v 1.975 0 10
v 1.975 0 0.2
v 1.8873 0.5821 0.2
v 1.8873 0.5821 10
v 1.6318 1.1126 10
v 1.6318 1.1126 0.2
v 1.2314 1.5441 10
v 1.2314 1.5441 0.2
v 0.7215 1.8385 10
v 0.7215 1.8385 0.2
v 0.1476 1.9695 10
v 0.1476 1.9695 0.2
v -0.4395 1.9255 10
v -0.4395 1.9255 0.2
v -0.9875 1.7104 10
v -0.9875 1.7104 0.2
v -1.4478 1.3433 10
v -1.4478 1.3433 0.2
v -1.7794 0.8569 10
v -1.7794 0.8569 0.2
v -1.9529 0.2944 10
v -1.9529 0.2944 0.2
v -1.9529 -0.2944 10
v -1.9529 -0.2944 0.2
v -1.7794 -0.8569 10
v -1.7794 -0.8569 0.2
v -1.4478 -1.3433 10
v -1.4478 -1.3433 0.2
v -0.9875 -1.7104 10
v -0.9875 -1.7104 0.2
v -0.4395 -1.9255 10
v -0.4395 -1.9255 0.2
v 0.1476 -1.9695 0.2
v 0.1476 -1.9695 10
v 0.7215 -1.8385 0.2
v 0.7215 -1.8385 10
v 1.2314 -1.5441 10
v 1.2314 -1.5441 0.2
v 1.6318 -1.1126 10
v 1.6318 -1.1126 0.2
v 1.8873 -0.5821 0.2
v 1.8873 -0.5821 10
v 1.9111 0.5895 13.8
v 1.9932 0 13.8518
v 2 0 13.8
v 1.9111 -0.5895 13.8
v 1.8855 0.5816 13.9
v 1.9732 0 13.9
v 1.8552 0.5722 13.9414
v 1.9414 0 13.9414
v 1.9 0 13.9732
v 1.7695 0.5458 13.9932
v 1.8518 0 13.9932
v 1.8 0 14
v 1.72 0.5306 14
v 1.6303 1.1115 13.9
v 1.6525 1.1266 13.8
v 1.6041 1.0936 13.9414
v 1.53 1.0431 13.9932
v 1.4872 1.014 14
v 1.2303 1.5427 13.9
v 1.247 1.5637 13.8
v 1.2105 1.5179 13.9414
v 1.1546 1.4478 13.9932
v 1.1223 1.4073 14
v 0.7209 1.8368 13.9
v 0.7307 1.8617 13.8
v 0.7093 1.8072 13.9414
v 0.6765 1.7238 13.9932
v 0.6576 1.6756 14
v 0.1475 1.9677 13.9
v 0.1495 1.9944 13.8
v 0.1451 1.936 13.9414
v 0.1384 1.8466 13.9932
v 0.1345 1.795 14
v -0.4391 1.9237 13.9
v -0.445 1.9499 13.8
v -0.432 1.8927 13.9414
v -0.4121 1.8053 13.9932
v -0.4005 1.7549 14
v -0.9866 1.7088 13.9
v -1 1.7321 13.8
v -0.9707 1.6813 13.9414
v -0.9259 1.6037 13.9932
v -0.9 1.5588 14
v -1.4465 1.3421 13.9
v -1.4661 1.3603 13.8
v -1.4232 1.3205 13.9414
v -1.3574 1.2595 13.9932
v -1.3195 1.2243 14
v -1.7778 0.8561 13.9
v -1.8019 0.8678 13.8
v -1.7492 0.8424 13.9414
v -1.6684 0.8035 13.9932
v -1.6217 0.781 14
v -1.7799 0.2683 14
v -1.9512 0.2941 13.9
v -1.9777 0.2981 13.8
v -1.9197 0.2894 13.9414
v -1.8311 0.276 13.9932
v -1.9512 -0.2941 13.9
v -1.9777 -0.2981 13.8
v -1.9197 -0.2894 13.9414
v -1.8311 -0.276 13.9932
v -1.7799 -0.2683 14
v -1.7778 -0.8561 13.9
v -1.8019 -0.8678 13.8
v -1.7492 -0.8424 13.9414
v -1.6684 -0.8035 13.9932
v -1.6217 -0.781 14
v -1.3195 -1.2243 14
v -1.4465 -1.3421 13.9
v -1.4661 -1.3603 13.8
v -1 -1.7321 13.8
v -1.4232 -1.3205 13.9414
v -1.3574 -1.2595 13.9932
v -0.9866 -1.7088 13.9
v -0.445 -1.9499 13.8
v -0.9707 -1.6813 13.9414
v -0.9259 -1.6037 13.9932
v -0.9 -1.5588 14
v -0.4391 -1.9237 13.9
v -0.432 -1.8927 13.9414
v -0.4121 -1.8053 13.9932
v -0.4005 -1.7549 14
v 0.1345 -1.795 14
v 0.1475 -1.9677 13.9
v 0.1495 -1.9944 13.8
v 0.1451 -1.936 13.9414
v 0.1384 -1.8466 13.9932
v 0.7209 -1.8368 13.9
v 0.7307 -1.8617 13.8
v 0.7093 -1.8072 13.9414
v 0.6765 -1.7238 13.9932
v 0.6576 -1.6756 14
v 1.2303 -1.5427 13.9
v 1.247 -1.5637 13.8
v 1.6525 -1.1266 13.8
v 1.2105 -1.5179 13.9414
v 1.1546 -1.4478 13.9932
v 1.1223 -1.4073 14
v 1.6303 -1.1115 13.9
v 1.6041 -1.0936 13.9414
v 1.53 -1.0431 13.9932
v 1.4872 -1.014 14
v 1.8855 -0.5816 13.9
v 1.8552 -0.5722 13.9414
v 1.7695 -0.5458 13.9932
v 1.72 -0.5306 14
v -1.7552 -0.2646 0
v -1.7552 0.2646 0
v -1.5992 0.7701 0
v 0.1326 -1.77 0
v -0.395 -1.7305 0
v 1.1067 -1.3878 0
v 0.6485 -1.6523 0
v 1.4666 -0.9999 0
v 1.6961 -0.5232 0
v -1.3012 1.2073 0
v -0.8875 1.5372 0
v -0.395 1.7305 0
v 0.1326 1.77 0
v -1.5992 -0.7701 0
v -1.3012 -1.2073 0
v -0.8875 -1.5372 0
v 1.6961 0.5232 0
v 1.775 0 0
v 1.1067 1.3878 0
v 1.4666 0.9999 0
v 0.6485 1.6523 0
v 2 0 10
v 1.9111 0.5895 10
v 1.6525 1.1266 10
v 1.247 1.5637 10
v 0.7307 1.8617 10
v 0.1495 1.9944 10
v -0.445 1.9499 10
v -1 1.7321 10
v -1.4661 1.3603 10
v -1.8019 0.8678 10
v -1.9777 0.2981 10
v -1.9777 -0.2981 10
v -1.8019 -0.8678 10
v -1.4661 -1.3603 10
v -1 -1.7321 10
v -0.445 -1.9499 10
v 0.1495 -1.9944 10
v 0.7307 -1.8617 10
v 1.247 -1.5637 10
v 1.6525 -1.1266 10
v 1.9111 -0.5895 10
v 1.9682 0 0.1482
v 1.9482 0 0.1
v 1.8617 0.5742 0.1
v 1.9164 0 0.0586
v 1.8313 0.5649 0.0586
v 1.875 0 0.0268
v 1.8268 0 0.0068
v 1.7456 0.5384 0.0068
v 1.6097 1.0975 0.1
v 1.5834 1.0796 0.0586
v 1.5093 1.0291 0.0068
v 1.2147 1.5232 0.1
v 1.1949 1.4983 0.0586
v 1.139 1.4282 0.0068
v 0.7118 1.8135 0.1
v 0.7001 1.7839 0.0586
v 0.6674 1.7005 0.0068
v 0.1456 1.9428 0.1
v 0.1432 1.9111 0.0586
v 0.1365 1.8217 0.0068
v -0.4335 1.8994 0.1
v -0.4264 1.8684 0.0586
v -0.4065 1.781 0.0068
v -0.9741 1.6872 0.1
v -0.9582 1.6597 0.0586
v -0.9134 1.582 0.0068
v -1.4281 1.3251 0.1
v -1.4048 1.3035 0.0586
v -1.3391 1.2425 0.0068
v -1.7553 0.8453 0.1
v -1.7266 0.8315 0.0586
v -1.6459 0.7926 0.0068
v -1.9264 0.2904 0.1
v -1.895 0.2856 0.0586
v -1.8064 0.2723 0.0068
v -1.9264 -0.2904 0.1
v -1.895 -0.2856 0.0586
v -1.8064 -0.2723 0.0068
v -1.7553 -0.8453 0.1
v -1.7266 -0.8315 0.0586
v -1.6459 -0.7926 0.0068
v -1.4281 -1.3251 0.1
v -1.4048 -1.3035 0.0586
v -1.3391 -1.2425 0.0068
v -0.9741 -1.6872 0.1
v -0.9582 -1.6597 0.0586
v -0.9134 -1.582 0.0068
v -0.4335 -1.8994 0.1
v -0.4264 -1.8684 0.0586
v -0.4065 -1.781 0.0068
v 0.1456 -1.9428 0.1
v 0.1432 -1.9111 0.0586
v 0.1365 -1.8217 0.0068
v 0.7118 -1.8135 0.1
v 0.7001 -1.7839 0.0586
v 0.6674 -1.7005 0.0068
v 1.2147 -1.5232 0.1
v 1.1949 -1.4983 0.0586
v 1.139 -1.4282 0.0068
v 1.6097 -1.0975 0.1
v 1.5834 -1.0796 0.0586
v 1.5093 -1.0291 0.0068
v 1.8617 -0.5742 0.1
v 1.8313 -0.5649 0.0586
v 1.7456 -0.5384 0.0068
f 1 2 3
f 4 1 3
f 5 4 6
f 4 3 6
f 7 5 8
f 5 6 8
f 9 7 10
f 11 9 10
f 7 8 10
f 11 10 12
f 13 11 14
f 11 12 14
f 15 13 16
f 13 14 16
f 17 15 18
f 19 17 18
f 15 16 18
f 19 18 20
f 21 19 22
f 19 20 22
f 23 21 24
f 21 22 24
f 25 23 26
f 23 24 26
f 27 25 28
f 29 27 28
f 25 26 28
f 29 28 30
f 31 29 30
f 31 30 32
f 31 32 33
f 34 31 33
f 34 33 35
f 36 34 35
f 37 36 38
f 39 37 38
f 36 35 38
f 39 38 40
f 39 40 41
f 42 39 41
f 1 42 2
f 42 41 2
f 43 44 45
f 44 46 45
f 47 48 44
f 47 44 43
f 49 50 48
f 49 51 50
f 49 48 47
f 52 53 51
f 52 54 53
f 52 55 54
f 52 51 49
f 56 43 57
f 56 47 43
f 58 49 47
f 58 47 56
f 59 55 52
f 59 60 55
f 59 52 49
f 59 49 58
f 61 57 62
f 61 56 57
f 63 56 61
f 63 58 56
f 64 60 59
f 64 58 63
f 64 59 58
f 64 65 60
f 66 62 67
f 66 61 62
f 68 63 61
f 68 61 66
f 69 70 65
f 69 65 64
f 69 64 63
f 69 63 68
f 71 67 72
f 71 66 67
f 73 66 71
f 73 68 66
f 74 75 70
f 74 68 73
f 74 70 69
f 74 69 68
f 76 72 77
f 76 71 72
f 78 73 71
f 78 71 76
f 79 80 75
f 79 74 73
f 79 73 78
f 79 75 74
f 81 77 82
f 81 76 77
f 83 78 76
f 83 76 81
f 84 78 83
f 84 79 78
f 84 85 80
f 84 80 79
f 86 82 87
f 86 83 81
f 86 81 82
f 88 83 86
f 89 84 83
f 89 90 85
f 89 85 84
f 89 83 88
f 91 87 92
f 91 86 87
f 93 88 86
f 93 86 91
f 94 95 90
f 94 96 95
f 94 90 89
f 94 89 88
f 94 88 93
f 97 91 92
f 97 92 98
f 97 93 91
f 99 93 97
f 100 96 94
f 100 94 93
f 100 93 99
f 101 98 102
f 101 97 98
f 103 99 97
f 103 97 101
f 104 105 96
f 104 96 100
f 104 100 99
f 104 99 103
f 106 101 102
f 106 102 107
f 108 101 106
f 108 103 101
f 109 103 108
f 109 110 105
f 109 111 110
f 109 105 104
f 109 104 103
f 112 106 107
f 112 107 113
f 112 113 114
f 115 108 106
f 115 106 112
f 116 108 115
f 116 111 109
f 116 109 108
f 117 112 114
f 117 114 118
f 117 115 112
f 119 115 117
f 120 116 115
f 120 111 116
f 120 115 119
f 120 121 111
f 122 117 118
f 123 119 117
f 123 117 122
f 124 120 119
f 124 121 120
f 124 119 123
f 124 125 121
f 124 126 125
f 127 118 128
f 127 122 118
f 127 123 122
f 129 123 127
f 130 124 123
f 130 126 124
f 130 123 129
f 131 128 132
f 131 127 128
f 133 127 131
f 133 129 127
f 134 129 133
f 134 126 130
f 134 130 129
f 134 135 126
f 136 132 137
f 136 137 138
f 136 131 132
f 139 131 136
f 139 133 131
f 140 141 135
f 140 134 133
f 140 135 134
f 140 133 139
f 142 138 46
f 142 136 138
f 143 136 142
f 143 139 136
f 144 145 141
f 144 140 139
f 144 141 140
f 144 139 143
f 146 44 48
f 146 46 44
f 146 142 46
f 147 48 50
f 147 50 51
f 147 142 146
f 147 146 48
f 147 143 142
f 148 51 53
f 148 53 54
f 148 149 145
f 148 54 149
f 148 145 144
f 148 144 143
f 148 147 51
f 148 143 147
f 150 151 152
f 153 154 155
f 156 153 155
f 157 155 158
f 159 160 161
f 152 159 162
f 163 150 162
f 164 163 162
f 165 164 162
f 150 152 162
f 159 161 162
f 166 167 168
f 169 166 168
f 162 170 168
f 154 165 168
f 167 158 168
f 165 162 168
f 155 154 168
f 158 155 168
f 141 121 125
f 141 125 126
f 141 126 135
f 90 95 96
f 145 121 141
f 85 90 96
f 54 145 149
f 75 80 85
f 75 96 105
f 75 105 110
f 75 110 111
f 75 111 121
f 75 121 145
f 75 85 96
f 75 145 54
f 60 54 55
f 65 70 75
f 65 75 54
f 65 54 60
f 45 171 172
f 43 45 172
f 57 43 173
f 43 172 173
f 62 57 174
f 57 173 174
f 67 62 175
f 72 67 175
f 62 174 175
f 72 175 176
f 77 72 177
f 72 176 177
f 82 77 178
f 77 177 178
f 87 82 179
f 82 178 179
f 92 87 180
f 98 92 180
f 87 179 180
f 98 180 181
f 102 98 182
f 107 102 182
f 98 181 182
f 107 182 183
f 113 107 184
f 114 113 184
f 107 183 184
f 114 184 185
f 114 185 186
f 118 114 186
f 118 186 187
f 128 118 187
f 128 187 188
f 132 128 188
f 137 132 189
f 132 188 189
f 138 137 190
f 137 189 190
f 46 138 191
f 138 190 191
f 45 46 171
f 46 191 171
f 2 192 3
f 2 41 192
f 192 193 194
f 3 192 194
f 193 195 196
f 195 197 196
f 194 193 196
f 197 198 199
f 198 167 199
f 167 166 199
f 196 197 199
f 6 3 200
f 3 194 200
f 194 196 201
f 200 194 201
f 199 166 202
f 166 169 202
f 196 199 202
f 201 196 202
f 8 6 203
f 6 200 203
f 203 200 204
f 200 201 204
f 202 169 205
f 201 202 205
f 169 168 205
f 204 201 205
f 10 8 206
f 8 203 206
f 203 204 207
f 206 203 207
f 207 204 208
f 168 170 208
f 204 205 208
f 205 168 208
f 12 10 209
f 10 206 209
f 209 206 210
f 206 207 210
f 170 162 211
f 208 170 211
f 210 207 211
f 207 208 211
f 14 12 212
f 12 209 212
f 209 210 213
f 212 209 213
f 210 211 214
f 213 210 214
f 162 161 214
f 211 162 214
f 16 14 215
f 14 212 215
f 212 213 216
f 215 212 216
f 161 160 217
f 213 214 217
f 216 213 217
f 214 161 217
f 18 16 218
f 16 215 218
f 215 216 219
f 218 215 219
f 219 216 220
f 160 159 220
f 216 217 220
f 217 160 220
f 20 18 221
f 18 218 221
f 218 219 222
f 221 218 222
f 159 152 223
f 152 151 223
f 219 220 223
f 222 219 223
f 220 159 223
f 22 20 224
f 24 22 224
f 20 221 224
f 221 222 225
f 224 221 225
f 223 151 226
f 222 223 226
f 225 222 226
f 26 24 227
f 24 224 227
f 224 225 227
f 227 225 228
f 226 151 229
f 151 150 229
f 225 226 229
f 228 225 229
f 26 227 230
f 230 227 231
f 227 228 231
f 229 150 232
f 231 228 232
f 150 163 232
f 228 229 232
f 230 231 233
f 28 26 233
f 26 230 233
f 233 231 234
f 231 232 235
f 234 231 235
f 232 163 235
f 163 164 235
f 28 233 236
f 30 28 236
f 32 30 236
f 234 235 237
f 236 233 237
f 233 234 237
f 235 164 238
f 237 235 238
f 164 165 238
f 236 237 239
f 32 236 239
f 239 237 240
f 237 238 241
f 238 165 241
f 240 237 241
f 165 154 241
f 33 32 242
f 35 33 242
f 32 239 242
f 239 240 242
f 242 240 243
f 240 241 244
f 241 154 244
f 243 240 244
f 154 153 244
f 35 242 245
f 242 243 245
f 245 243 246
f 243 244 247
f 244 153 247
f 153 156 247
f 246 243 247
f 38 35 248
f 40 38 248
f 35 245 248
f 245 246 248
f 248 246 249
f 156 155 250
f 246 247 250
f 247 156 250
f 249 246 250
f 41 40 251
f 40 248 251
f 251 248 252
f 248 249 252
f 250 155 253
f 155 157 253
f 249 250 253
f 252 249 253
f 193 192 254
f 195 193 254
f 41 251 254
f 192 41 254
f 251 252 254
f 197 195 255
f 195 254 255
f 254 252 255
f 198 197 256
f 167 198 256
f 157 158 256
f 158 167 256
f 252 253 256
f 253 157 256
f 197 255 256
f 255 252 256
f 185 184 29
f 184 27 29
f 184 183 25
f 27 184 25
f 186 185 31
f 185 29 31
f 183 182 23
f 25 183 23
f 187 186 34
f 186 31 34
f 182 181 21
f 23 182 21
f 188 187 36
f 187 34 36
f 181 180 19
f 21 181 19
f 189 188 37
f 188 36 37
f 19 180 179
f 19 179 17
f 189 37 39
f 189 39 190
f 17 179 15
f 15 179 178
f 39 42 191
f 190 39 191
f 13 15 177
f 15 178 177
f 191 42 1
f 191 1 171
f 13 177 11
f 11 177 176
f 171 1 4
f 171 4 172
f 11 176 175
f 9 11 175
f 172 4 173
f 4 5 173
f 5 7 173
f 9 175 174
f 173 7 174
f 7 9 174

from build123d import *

# Parameters (mm, degrees)
SKETCH_1_R      = 1.975
EXTRUDE_1_DEPTH = 10
FILLET_1_R      = 0.2
SKETCH_2_R      = 2
EXTRUDE_2_DEPTH = 4
FILLET_2_R      = 0.2


with BuildPart() as part:
    # 스케치1 → 보스-돌출1 (new body)
    with BuildSketch(Plane.XY):
        Circle(SKETCH_1_R)
    extrude(amount=EXTRUDE_1_DEPTH)

    # 필렛1
    fillet_1_edges = [part.edges().sort_by_distance(p)[0] for p in [
        (-1.975, 0, 0),
    ]]
    fillet(fillet_1_edges, radius=FILLET_1_R)

    # 스케치2 → 보스-돌출2 (add)
    with BuildSketch(Plane.XY.offset(10)):
        Circle(SKETCH_2_R)
    extrude(amount=EXTRUDE_2_DEPTH)

    # 필렛2
    fillet_2_edges = [part.edges().sort_by_distance(p)[0] for p in [
        (-2, 0, 14),
    ]]
    fillet(fillet_2_edges, radius=FILLET_2_R)


solid = part.part
